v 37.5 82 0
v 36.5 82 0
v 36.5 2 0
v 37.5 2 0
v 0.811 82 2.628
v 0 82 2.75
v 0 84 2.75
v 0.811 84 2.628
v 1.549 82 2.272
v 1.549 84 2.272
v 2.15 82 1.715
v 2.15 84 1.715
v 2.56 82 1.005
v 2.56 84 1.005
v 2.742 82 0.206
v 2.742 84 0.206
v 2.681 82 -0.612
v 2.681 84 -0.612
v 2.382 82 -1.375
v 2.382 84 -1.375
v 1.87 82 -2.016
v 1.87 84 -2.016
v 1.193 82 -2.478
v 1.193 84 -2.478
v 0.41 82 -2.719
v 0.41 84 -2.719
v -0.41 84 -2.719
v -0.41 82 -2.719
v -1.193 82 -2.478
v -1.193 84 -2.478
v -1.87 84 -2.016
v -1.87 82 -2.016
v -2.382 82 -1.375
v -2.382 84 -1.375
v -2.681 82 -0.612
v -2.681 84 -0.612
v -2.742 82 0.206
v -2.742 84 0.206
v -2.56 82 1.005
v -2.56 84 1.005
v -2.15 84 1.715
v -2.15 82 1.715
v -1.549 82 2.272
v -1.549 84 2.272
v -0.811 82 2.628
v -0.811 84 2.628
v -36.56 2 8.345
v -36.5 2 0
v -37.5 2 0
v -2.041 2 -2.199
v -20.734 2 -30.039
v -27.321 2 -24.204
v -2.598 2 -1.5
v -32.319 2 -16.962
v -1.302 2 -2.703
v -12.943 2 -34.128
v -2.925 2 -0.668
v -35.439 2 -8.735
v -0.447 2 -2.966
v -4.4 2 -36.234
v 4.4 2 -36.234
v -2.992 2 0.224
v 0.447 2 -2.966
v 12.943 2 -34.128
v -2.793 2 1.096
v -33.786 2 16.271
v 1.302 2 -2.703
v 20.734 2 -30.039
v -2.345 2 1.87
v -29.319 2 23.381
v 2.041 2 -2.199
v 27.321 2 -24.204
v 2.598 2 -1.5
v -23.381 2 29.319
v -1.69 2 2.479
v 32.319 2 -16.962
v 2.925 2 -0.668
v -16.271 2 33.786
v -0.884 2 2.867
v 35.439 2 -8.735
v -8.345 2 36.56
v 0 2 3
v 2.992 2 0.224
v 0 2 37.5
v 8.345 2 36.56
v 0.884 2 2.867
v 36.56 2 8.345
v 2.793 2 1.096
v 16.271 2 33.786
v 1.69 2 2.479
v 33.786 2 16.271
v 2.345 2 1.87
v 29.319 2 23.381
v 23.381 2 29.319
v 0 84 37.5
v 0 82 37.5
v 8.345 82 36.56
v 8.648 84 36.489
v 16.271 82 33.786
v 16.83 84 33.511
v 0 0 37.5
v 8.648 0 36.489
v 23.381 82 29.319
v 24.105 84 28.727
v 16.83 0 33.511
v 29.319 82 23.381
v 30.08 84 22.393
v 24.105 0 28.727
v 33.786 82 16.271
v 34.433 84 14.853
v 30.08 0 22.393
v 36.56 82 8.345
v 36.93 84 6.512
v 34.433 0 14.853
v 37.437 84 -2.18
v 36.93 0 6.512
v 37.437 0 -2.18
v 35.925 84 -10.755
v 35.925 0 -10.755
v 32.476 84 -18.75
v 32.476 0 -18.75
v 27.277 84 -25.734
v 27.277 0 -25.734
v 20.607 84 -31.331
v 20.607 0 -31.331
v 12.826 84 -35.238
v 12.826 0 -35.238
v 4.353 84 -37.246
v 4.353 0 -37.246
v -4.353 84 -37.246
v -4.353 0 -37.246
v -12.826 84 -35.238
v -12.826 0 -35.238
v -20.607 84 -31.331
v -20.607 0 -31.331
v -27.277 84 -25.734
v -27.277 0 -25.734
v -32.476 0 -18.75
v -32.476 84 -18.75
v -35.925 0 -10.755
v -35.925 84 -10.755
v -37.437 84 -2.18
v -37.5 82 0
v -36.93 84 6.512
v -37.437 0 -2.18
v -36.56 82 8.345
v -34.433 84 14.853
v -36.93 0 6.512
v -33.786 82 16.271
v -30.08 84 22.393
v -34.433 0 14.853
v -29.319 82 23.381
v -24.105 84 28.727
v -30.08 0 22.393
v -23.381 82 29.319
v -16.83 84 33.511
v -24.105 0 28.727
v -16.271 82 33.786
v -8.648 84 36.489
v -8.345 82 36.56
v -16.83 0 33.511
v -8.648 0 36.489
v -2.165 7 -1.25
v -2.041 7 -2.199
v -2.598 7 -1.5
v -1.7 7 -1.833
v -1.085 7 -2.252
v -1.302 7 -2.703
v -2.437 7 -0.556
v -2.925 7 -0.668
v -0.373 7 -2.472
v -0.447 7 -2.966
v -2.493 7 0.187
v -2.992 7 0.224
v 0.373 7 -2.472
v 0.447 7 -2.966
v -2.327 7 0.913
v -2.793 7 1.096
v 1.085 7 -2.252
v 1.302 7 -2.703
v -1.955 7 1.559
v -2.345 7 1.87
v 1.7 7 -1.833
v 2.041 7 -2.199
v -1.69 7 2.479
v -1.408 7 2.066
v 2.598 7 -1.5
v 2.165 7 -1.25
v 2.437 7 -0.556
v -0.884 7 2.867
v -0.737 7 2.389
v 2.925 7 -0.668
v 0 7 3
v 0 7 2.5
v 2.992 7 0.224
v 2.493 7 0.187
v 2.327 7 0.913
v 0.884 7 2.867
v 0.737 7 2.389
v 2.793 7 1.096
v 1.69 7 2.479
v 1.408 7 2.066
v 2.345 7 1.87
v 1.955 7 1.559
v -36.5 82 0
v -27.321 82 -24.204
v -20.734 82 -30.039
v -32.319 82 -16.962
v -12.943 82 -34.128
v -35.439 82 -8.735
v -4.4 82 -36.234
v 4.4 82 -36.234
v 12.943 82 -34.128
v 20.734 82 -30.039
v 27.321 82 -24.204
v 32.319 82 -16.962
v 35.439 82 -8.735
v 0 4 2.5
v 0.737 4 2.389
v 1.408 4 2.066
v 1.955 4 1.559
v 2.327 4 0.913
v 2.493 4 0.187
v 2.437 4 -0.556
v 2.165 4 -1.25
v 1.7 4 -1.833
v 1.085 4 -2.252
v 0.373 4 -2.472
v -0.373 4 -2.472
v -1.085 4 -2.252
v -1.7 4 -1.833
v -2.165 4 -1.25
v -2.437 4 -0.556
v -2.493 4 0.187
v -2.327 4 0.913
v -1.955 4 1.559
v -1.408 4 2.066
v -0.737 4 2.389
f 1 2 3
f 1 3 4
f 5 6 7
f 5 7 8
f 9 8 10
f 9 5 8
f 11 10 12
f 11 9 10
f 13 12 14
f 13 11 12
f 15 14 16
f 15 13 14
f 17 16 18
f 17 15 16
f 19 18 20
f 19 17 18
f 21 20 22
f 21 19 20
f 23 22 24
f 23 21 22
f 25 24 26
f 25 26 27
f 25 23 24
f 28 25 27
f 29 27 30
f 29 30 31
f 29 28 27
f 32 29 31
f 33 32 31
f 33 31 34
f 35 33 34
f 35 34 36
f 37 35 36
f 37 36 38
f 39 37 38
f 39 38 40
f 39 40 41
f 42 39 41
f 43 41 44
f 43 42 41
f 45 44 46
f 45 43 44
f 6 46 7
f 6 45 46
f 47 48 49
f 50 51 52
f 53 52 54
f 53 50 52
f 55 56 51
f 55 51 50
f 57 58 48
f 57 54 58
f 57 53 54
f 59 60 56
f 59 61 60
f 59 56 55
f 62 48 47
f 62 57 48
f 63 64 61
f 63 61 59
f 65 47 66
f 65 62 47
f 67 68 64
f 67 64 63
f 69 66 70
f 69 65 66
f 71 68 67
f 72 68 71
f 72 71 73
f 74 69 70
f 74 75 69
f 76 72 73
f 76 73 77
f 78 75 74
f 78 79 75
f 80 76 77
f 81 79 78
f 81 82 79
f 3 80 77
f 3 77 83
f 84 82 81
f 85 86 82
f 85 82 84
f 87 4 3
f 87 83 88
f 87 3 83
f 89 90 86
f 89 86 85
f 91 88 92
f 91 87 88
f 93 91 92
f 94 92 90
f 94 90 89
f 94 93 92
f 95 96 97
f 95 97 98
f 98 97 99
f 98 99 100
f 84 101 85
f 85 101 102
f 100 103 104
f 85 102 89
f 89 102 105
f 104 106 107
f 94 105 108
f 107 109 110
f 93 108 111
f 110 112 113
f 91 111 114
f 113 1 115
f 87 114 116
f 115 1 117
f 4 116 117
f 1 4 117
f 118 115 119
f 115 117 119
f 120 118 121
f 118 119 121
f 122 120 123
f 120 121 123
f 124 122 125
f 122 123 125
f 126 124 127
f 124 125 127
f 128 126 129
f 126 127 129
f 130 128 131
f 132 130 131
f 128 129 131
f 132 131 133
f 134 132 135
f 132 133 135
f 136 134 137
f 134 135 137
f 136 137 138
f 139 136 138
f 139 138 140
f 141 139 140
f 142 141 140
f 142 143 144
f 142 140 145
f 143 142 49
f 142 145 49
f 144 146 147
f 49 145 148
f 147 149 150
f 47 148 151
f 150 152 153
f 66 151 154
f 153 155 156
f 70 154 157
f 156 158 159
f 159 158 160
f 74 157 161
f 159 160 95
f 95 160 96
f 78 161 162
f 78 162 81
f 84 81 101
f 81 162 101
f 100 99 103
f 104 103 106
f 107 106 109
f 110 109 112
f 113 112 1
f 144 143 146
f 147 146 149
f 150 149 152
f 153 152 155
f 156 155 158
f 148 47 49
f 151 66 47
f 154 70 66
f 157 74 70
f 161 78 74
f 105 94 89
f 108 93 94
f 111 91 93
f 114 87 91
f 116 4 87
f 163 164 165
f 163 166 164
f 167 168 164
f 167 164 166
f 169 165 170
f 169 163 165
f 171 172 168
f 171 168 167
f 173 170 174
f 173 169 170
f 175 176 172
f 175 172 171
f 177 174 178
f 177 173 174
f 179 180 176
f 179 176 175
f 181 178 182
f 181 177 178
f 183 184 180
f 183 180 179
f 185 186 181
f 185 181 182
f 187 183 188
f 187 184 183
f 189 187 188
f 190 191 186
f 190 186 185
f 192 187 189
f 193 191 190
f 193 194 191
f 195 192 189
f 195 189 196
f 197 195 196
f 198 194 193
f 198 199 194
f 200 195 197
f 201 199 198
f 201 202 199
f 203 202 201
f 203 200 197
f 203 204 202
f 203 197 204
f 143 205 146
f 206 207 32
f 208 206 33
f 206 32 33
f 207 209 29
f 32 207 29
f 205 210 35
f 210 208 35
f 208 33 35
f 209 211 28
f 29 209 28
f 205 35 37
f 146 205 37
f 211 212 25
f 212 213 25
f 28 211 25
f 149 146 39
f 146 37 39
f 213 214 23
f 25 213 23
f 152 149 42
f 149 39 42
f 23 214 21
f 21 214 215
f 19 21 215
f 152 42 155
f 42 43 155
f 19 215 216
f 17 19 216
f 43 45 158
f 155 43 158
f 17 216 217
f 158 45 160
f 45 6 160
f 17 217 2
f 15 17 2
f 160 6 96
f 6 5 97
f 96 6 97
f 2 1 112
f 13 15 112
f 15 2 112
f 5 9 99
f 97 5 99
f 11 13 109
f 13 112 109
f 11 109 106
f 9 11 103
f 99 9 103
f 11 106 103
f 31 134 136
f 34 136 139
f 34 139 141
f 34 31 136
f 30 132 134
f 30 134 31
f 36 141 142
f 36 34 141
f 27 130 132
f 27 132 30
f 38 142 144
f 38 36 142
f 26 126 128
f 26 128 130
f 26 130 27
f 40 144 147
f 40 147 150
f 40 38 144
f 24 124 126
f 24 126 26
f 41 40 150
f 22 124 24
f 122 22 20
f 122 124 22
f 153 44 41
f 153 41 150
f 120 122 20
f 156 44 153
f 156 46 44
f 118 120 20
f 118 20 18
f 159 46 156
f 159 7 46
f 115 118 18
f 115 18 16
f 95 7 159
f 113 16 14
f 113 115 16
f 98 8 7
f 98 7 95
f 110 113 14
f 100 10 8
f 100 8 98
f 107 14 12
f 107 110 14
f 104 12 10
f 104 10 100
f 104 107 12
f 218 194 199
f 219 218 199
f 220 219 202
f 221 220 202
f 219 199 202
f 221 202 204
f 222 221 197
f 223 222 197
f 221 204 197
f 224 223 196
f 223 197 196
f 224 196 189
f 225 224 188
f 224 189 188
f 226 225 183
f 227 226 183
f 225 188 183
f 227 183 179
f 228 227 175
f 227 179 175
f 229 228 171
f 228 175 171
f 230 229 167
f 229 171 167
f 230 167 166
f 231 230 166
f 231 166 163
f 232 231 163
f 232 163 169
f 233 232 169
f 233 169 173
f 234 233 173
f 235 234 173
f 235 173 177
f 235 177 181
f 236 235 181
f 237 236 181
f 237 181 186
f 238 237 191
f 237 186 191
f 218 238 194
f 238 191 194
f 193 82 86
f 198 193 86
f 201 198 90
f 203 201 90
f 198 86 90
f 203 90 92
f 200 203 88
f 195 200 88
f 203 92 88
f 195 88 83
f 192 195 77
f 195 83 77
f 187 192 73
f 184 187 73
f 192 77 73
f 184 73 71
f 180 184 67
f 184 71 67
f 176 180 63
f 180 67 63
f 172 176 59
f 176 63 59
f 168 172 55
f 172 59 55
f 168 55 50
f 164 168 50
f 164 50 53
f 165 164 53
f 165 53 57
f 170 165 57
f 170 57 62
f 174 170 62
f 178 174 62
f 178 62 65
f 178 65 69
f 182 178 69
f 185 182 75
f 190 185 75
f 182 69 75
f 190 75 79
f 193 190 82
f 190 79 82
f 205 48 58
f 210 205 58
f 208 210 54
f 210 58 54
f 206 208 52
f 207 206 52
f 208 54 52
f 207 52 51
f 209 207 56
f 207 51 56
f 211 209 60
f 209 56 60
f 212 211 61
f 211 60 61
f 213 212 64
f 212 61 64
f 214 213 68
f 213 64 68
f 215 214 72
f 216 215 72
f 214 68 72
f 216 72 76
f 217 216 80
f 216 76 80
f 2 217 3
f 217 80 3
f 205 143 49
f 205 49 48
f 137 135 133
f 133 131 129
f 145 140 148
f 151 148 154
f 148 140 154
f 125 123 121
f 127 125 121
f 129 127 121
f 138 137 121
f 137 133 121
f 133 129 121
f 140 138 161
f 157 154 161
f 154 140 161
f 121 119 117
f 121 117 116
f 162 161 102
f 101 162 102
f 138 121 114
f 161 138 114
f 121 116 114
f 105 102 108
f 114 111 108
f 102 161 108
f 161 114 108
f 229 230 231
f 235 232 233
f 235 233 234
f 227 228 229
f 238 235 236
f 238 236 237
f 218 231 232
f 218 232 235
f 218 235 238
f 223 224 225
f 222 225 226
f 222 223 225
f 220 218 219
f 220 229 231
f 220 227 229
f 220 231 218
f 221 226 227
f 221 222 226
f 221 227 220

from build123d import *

# Parameters (mm, degrees)
SKETCH1_R           = 37.5
BOSS_EXTRUDE1_DEPTH = 2
SKETCH2_R           = 3
BOSS_EXTRUDE2_DEPTH = 5
SKETCH3_R           = 2.5
CUT_EXTRUDE1_DEPTH  = 3
BOSS_EXTRUDE3_DEPTH = 80
SKETCH5_R           = 37.5
SKETCH5_R_2         = 2.75
BOSS_EXTRUDE4_DEPTH = 2


with BuildPart() as part:
    # Sketch1 → Boss-Extrude1 (new body)
    with BuildSketch(Plane(origin=(0, 0, 0), x_dir=(1, 0, 0), z_dir=(0, 1, 0))):
        with Locations(Location((0, 0, 0), (0, 0, 270))):
            Circle(SKETCH1_R)
    extrude(amount=BOSS_EXTRUDE1_DEPTH)

    # Sketch2 → Boss-Extrude2 (add)
    with BuildSketch(Plane(origin=(0, 2, 0), x_dir=(1, 0, 0), z_dir=(0, 1, 0))):
        with Locations(Location((0, 0, 0), (0, 0, 270))):
            Circle(SKETCH2_R)
    extrude(amount=BOSS_EXTRUDE2_DEPTH)

    # Sketch3 → Cut-Extrude1 (cut)
    with BuildSketch(Plane(origin=(0, 7, 0), x_dir=(1, 0, 0), z_dir=(0, 1, 0))):
        with Locations(Location((0, 0, 0), (0, 0, 270))):
            Circle(SKETCH3_R)
    extrude(amount=-CUT_EXTRUDE1_DEPTH, mode=Mode.SUBTRACT)

    # Sketch4 → Boss-Extrude3 (add)
    with BuildSketch(Plane(origin=(0, 2, 0), x_dir=(1, 0, 0), z_dir=(0, 1, 0))):
        with BuildLine():
            Line((-37.5, 0), (-36.5, 0))
            ThreePointArc((-36.5, 0), (0, 36.5), (36.5, 0))
            Line((36.5, 0), (37.5, 0))
            ThreePointArc((37.5, 0), (0, 37.5), (-37.5, 0))
        make_face()
    extrude(amount=BOSS_EXTRUDE3_DEPTH)

    # Sketch5 → Boss-Extrude4 (add)
    with BuildSketch(Plane(origin=(0, 82, 0), x_dir=(1, 0, 0), z_dir=(0, 1, 0))):
        with Locations(Location((0, 0, 0), (0, 0, 270))):
            Circle(SKETCH5_R)
        with Locations(Location((0, 0, 0), (0, 0, 270))):
            Circle(SKETCH5_R_2, mode=Mode.SUBTRACT)
    extrude(amount=BOSS_EXTRUDE4_DEPTH)


solid = part.part
